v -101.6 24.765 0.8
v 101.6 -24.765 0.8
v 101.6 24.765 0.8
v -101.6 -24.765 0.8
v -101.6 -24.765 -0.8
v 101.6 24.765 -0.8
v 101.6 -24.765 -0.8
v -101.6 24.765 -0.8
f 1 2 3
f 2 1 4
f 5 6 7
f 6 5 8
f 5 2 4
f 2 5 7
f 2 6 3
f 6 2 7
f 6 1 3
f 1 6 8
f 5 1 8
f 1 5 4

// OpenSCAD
translate([-101.6, -24.765, -0.8])
    cube([203.2, 49.53, 1.6]);
